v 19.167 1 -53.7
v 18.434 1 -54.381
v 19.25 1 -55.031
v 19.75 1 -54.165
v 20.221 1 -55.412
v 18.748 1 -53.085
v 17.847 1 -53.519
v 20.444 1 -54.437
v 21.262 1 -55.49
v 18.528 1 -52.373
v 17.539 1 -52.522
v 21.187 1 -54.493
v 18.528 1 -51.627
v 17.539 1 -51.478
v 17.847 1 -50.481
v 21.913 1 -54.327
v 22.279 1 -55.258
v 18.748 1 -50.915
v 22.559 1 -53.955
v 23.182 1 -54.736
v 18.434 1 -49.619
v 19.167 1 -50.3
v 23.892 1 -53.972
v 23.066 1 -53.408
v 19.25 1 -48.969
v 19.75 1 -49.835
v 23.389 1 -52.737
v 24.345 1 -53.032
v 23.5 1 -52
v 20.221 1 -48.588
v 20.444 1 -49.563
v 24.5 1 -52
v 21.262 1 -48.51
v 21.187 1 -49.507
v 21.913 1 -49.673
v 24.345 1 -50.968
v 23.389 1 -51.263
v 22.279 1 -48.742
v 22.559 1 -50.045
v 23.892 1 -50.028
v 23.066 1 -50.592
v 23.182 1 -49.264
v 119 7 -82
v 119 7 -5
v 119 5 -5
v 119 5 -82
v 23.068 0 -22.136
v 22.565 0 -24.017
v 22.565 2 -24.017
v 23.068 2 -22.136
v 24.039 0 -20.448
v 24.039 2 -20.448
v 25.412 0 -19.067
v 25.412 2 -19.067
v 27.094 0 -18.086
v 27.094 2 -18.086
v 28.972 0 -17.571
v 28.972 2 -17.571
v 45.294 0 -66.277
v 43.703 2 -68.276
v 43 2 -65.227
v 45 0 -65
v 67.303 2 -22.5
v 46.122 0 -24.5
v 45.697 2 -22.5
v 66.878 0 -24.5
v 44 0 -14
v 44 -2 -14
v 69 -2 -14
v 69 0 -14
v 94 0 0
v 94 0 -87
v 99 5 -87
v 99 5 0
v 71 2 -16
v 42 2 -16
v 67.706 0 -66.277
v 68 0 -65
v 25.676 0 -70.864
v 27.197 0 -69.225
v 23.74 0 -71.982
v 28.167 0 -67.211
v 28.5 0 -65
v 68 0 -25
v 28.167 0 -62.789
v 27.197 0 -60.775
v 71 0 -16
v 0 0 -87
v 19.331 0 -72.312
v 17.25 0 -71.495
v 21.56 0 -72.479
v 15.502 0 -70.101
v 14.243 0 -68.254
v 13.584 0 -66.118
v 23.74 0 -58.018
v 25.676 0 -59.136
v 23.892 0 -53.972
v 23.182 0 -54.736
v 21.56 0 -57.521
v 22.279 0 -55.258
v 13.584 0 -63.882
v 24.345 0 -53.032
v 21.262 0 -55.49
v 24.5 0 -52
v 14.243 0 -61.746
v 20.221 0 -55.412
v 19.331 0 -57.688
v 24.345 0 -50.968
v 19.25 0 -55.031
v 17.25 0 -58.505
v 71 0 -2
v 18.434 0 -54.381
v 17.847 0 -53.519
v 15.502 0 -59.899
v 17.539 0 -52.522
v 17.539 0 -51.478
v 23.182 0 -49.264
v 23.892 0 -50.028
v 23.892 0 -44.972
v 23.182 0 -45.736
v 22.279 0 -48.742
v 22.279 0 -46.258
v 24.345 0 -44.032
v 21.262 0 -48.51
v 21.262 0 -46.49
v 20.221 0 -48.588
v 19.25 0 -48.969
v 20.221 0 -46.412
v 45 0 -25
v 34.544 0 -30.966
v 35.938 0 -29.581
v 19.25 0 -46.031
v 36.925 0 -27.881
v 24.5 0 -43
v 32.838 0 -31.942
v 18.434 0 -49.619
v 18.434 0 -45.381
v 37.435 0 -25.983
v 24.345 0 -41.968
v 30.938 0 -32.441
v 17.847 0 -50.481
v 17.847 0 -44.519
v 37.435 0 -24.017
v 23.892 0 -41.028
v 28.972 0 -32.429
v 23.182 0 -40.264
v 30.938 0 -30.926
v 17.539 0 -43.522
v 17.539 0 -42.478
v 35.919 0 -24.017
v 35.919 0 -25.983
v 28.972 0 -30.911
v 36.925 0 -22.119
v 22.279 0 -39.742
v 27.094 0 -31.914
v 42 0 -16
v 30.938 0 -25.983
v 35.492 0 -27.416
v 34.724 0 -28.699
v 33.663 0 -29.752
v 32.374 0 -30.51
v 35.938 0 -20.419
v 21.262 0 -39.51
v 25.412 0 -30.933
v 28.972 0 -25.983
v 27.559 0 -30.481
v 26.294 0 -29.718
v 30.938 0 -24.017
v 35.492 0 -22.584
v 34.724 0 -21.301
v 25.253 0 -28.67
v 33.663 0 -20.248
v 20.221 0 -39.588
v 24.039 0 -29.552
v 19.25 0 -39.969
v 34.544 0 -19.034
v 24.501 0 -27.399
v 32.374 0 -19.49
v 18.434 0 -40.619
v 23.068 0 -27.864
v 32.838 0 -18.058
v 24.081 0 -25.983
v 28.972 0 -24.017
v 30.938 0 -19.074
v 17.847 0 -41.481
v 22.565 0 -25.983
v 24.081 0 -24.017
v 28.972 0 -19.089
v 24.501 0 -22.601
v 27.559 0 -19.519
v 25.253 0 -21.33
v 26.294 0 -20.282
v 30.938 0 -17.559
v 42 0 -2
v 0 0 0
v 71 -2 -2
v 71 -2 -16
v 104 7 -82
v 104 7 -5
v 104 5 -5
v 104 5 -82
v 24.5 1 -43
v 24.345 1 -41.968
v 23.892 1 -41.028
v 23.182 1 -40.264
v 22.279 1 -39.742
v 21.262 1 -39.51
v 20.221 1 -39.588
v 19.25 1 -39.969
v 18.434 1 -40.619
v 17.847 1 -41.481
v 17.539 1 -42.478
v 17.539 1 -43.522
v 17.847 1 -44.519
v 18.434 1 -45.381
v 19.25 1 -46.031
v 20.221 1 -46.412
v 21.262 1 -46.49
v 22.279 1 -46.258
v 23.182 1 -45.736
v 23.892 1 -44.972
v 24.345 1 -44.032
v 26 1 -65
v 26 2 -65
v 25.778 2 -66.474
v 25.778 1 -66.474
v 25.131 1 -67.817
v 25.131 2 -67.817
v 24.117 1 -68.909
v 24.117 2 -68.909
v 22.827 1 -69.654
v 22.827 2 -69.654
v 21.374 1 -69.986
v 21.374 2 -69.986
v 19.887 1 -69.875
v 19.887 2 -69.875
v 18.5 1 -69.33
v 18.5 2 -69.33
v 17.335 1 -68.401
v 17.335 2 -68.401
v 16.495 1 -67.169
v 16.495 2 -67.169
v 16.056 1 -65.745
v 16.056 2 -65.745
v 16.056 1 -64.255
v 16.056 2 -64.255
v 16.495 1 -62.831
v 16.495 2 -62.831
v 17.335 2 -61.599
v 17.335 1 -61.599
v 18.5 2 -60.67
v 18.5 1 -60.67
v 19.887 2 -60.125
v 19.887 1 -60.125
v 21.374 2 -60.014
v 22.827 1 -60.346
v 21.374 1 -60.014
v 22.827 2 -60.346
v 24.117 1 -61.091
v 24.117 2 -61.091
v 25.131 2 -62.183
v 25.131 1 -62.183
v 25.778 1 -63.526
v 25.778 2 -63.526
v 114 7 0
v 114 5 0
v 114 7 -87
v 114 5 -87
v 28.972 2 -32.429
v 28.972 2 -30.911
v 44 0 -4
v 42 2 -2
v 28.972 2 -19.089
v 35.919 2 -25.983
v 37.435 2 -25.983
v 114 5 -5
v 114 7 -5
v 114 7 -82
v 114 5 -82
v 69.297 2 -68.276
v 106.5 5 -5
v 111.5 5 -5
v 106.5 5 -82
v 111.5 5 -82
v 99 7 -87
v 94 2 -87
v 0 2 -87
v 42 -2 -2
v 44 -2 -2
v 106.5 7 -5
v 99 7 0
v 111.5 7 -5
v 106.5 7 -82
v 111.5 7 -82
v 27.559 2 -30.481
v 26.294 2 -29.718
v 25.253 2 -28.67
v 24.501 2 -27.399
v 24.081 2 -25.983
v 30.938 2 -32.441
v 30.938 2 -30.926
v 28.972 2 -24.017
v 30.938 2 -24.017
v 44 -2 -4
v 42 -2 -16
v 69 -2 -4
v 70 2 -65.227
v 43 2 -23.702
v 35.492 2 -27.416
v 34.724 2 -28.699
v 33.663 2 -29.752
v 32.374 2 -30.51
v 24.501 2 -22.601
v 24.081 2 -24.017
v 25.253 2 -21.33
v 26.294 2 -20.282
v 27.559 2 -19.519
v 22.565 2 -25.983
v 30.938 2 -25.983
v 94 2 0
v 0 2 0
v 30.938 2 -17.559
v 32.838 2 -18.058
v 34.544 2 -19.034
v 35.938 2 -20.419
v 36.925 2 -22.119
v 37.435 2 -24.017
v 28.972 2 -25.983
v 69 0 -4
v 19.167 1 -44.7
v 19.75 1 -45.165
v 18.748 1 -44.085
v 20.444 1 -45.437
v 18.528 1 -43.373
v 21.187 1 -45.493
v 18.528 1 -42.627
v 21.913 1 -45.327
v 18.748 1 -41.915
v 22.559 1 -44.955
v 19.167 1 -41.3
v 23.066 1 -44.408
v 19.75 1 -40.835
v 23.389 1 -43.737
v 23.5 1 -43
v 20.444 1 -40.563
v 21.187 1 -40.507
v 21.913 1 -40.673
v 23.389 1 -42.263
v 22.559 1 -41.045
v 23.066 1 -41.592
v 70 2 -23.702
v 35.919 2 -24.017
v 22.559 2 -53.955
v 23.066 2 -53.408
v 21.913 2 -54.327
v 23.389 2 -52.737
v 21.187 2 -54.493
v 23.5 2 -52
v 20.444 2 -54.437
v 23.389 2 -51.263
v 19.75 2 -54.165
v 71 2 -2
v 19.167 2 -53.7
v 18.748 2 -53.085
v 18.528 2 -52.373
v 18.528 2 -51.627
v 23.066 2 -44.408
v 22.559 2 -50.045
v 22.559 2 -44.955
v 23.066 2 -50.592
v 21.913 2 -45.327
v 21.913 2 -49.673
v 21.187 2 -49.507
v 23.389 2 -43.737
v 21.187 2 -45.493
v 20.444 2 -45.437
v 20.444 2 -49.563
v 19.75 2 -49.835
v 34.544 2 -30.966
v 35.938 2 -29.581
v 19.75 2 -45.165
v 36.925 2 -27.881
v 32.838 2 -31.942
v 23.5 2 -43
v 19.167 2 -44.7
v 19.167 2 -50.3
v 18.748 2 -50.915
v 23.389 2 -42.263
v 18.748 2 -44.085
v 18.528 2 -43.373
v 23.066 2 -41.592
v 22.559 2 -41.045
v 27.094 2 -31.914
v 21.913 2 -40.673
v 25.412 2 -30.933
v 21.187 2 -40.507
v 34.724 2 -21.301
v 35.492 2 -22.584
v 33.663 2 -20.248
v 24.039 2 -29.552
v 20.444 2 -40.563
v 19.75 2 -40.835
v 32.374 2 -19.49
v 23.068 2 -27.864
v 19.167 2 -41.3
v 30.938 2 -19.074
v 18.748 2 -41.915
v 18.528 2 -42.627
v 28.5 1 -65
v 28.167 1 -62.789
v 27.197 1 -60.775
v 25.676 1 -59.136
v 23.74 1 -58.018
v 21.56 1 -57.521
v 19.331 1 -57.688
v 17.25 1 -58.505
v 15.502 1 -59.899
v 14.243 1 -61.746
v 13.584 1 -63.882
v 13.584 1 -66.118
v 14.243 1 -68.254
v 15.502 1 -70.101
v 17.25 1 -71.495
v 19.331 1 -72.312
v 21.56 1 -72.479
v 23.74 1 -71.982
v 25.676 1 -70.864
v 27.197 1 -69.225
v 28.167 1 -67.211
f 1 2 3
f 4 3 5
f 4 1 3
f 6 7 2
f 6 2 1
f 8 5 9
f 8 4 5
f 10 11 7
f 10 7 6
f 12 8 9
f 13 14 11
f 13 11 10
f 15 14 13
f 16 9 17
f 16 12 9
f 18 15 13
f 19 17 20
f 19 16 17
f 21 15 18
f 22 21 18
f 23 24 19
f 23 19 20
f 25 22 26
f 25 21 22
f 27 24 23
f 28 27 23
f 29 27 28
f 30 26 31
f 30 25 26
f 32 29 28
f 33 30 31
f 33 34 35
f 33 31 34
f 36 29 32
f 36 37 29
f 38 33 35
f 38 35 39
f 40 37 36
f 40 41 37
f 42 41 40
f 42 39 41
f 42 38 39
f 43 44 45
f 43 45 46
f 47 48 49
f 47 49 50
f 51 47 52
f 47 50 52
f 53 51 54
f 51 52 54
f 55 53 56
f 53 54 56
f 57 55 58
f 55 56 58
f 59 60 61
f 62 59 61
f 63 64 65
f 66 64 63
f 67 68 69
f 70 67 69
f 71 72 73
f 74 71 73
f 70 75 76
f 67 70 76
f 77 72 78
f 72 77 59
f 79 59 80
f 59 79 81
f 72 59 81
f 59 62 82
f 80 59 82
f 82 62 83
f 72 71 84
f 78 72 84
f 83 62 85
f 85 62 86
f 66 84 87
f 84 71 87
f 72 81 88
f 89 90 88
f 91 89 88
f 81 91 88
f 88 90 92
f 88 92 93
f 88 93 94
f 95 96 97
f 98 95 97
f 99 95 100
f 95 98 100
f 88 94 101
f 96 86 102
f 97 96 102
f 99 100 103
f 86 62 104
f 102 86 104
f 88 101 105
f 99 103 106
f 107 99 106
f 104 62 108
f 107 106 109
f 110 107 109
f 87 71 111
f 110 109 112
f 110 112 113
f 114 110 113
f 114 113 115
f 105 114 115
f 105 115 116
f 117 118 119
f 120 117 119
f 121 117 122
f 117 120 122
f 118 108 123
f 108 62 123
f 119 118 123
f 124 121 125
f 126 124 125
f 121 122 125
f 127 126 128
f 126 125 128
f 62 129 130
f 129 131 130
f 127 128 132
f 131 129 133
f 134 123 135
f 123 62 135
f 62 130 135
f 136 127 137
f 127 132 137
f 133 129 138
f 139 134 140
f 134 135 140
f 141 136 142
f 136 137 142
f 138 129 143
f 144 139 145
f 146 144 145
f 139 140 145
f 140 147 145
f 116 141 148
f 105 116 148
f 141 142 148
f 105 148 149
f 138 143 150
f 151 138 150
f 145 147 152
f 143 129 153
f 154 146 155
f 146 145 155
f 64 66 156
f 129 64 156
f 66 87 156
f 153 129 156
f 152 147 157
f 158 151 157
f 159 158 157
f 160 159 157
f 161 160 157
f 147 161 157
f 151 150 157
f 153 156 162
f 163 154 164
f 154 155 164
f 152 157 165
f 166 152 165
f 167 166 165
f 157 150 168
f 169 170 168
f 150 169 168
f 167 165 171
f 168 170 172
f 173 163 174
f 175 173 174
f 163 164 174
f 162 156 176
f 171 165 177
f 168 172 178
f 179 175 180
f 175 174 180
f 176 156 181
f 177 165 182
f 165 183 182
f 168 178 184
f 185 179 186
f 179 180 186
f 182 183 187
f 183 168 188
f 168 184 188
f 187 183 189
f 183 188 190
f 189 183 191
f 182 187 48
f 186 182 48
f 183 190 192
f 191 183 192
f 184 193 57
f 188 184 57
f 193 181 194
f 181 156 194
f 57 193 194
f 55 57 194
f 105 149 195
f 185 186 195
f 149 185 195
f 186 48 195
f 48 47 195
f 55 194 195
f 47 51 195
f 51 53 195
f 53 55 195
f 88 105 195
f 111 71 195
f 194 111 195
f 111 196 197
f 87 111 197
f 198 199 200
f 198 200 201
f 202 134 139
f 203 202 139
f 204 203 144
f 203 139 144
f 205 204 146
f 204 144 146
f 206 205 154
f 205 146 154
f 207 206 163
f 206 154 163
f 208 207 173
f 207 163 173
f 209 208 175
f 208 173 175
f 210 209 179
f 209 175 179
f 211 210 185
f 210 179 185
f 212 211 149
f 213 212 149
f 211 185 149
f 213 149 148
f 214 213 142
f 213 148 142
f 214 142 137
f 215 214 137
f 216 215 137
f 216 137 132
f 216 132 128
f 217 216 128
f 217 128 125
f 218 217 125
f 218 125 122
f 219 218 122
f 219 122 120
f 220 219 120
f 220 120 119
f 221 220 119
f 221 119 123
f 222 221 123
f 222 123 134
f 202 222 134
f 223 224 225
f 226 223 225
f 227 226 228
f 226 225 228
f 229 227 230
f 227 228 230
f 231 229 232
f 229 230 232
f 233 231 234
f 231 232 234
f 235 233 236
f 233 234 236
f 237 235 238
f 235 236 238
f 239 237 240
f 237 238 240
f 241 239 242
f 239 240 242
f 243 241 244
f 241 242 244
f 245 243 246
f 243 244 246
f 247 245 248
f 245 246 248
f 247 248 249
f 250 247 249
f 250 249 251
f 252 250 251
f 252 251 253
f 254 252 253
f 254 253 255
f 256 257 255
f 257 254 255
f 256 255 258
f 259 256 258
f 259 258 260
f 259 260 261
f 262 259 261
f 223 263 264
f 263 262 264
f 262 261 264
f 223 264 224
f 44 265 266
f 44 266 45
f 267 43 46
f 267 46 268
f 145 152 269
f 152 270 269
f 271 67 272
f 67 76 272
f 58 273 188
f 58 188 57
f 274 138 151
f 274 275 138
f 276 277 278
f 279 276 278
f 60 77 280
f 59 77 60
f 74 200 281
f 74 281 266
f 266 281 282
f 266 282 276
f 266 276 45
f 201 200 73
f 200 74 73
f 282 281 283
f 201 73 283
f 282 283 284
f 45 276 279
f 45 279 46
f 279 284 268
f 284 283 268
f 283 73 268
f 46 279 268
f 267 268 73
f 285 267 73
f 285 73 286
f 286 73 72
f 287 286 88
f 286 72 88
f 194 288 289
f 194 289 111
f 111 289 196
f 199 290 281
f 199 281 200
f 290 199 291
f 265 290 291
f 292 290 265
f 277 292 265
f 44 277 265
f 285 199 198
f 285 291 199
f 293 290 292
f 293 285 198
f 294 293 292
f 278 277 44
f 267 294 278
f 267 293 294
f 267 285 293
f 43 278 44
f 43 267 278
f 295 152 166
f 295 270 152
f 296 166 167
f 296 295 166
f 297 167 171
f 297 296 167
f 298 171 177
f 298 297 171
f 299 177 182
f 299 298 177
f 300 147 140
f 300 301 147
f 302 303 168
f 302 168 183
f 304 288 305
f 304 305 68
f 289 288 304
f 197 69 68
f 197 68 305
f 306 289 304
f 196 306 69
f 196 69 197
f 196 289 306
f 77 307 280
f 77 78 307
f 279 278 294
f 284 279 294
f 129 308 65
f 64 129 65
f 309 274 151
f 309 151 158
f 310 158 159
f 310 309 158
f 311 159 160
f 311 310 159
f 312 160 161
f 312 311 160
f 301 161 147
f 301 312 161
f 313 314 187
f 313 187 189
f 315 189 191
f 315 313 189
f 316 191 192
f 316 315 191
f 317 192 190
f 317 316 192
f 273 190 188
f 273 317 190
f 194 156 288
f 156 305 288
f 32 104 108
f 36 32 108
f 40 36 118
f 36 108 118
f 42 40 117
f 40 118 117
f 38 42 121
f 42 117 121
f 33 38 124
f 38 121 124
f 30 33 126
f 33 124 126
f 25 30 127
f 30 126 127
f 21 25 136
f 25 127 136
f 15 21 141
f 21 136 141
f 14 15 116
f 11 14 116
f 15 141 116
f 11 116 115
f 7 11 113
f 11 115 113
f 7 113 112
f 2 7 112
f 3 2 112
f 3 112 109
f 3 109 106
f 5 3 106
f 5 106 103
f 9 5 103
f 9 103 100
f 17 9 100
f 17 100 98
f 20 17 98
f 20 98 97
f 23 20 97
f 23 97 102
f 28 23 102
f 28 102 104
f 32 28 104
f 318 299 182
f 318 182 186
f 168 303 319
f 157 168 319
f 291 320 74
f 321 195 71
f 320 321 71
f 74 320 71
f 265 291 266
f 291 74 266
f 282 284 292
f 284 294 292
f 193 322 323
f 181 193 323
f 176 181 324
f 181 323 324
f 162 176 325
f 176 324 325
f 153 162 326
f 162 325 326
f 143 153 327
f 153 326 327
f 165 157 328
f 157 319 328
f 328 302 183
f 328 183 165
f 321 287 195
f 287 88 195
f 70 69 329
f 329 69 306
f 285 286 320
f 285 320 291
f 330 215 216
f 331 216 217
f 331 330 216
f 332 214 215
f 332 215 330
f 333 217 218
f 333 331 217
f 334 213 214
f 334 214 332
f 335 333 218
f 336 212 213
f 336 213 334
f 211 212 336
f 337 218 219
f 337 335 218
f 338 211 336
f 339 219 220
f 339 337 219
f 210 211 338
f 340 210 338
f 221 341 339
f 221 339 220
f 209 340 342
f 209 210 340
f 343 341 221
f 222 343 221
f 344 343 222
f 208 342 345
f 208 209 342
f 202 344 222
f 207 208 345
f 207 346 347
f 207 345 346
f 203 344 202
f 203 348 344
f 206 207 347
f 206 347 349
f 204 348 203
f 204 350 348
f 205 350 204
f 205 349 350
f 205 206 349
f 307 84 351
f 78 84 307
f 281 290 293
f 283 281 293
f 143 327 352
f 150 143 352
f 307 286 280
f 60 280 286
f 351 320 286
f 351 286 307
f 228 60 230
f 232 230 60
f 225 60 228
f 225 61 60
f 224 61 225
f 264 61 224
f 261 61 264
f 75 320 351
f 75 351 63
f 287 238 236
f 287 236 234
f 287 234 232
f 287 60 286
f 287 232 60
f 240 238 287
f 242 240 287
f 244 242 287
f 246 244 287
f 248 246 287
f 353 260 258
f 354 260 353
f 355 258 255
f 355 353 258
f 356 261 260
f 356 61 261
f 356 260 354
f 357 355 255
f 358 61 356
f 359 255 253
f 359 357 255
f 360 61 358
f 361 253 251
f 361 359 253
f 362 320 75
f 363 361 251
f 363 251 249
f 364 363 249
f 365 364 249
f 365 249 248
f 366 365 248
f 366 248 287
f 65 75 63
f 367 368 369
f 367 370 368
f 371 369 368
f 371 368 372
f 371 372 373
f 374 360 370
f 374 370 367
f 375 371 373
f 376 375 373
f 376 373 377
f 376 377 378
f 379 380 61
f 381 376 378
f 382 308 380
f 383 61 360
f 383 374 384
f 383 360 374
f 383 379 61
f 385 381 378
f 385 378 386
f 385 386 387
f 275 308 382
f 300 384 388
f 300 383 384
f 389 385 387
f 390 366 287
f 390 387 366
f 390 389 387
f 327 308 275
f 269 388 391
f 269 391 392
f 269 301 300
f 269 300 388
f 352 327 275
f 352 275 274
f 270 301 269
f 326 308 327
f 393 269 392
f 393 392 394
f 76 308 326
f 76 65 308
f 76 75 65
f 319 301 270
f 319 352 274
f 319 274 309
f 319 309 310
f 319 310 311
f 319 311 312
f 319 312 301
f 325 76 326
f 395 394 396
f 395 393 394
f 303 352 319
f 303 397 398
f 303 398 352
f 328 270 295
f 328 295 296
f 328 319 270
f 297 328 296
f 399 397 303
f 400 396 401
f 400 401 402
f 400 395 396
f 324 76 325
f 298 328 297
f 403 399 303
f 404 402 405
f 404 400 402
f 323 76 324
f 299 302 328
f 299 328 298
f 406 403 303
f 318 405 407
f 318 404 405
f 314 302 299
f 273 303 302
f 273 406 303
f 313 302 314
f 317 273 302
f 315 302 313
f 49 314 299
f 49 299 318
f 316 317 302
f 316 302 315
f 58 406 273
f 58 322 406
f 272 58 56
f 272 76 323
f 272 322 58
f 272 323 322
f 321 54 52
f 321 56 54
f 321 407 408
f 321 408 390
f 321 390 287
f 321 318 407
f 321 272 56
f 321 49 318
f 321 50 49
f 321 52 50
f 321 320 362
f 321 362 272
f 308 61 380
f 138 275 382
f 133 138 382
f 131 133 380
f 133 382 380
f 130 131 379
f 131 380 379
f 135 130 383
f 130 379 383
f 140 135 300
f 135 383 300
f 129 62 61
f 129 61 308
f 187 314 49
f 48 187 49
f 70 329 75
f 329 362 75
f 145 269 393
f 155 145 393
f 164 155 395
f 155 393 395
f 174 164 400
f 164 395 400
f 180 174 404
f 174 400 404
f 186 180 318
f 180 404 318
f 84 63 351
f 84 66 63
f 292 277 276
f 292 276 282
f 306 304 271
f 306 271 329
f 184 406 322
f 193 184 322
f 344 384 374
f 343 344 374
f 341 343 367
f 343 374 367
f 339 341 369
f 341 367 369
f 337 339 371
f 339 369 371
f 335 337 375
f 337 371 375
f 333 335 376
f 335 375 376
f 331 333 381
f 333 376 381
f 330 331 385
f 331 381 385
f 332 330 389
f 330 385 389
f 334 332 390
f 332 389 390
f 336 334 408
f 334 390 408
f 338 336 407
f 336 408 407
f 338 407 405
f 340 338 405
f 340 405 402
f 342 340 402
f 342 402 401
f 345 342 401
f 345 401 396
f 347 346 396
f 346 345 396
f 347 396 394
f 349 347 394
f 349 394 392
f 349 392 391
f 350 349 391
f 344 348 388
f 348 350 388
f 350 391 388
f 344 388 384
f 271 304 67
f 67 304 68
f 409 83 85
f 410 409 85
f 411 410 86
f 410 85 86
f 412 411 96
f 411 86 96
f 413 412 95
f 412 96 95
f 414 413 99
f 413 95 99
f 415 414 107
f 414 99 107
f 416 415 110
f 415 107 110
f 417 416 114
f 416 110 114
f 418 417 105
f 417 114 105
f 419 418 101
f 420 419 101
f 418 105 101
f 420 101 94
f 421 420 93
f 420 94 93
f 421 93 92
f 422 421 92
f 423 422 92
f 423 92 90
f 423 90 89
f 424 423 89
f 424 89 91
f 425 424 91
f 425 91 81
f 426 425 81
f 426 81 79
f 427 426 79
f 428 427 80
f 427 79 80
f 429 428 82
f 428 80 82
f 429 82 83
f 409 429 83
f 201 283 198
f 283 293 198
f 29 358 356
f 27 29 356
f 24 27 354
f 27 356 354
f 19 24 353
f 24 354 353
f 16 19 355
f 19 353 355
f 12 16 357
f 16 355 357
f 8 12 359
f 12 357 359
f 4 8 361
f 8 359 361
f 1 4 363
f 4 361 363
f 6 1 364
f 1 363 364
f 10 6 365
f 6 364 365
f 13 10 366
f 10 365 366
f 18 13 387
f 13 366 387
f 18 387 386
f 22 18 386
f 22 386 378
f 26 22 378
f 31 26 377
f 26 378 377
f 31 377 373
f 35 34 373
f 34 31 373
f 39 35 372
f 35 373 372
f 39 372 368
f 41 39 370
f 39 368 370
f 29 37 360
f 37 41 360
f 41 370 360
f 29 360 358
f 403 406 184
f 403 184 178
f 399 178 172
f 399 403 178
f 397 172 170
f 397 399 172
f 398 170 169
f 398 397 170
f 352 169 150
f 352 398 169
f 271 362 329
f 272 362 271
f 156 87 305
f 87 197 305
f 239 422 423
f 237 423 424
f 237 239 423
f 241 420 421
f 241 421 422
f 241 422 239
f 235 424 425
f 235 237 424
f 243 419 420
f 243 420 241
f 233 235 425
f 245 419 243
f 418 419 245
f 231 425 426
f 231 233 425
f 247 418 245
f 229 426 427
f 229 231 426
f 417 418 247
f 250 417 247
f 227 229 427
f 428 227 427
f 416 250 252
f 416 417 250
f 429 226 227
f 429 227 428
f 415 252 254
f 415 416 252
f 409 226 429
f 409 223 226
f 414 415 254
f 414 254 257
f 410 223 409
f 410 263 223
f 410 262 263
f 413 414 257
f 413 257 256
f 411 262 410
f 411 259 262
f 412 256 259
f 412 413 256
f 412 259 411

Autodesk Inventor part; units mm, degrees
ref_plane "YZ Plane" through (0, 0, 0) normal (1, 0, 0) x (0, 1, 0)
ref_plane "XZ Plane" through (0, 0, 0) normal (0, 1, 0) x (-1, 0, 0)
ref_plane "XY Plane" through (0, 0, 0) normal (0, 0, 1) x (1, 0, 0)
sketch "Sketch1" plane through (0, 0, 0) normal (0, 1, 0) x (-1, 0, 0)
  line L0 (0, 0) -> (-94, 0)
  line L1 (-94, 0) -> (-94, -87)
  line L2 (-94, -87) -> (0, -87)
  line L3 (0, -87) -> (0, 0)
  dimension "d0" = 94
  dimension "d1" = 87
extrude "Extrusion1" add sketch "Sketch1" along normal blind 2
sketch "Sketch2" plane through (0, 0, 0) normal (0, 0, 1) x (1, 0, 0)
  line L0 (94, 2) -> (0, 2) projected
  line L1 (-0.0001, 2) -> (94, 2)
  line L2 (94, 2) -> (99, 7)
  line L3 (94, 2) -> (101.071, 2) construction
  line L4 (94, 0) -> (99, 5)
  line L5 (99, 5) -> (114, 5)
  line L6 (114, 5) -> (114, 7)
  line L7 (114, 7) -> (99, 7)
  line L8 (94, 0) -> (94, 2) projected
  line L9 (94, 0) -> (94, 2)
  point P0 (0, 0)
  dimension "d4" = 7.071
  dimension "d5" = 45
  dimension "d6" = 7.071
  dimension "d7" = 15
  dimension "d8" = 2
extrude "Extrusion2" add sketch "Sketch2" against normal blind 87
sketch "Sketch3" plane through (99, 7, 0) normal (0, 1, 0) x (1, 0, 0)
  line L0 (15, 0) -> (0, 0) projected
  line L1 (15, 0) -> (20, 5)
  line L2 (15, 0) -> (22.071, 0) construction
  line L3 (20, 5) -> (20, 82)
  line L4 (0, 87) -> (15, 87) projected
  line L5 (20, 82) -> (15, 87)
  line L6 (15, 0) -> (15, 87)
  point P0 (-99, 0)
  dimension "d11" = 7.071
  dimension "d12" = 45
  dimension "d13" = 77
extrude "Extrusion3" add sketch "Sketch3" against normal blind 2
sketch "Sketch4" plane through (0, 2, 0) normal (0, 1, 0) x (1, 0, 0)
  line L0 (0, 0) -> (94, 0) projected
  line L1 (0, 0) -> (0, 4)
  line L2 (0, 87) -> (0, 0) projected
  line L3 (0, 4) -> (94, 4)
  line L4 (0, 4) -> (44, 4)
  line L5 (44, 4) -> (44, 14)
  line L6 (44, 14) -> (69, 14)
  line L7 (69, 14) -> (69, 4)
  dimension "d16" = 4
  dimension "d17" = 44
  dimension "d18" = 10
  dimension "d19" = 25
extrude "Extrusion4" cut sketch "Sketch4" against normal blind 10
ref_plane "Work Plane1" through (0, -2, 0) normal (0, -1, 0) x (1, 0, 0)
sketch "Sketch6" plane through (0, -2, 0) normal (0, -1, 0) x (1, 0, 0)
  line L0 (44, -4) -> (44, -14) projected
  line L1 (44, -4) -> (44, -2)
  line L2 (0, 0) -> (94, 0) projected
  line L3 (44, -2) -> (42, -2)
  line L4 (42, -2) -> (71, -2)
  line L5 (71, -2) -> (71, -16)
  line L6 (71, -16) -> (42, -16)
  line L7 (42, -16) -> (42, -2)
  line L8 (44, -4) -> (69, -4) projected
  line L9 (44, -14) -> (69, -14)
  line L10 (69, -14) -> (69, -4)
  line L11 (69, -4) -> (44, -4)
  line L12 (44, -4) -> (44, -14)
  dimension "d23" = 2
  dimension "d24" = 2
  dimension "d25" = 29
  dimension "d26" = 14
extrude "Extrusion5" add sketch "Sketch6" against normal blind 2
chamfer "Chamfer1" distance 2 angle 45 4 edges at (44, 2, -9) (56.5, 2, -14) (69, 2, -9) (56.5, 2, -4)
sketch "Sketch8" plane through (0, 2, 0) normal (0, 1, 0) x (1, 0, 0)
  line L0 (0, 0) -> (0, 25)
  line L1 (0, 87) -> (0, 0) projected
  line L2 (0, 25) -> (30, 25)
  circle A0 centre (30, 25) radius 7.5
  line L3 (30, 17.5) -> (30, 32.5)
  line L4 (37.5, 25) -> (22.5, 25)
  circle A1 centre (30, 25) radius 6
  line L5 (37.5, 25) -> (30, 25)
  line L6 (30, 25) -> (24, 25)
  line L7 (30, 25) -> (33.75, 25)
  line L8 (30, 25) -> (31.875, 25)
  line L9 (30, 25) -> (30.9375, 25)
  line L10 (30.9375, 25) -> (30.9375, 32.4412)
  line L11 (30.9375, 25) -> (28.9715, 25)
  line L12 (28.9715, 25) -> (28.9715, 32.4291)
  line L13 (30.9375, 25) -> (30.9375, 17.5588)
  line L14 (28.9715, 25) -> (28.9715, 17.5709)
  line L15 (30, 25) -> (30, 24.017)
  line L16 (30, 24.017) -> (30, 25.983)
  line L17 (37.4353, 25.983) -> (22.5647, 25.983)
  line L18 (37.4353, 24.017) -> (22.5647, 24.017)
  point P0 (30.9375, 24.017)
  point P1 (30.9375, 25.983)
  point P2 (28.9715, 25.983)
  point P3 (28.9715, 24.017)
  point P4 (24.0811, 25.983)
  point P5 (28.9715, 30.9112)
  point P6 (24.0811, 24.017)
  point P7 (28.9715, 19.0888)
  point P8 (35.9189, 24.017)
  point P9 (30.9375, 19.0737)
  point P10 (35.9189, 25.983)
  point P11 (30.9375, 30.9263)
  dimension "d34" = 15
  dimension "d35" = 12
  dimension "d32" = 25
  dimension "d33" = 30
  dimension "d36" = 1.966
  dimension "d37" = 0.983
  dimension "d38" = 1.966
extrude "Extrusion6" cut sketch "Sketch8" against normal blind 2 contours A0 L12 A1 L17 | L18 A1 L14 A0 | L12 L17 L3 L2 | L2 L3 L18 L14 | L4 L13 L18 L3 | L3 L17 L10 L4 | A0 L17 A1 L10 | L13 A1 L18 A0
sketch "Sketch9" plane through (0, 2, 0) normal (0, 1, 0) x (1, 0, 0)
  line L0 (0, 0) -> (0, 43)
  line L1 (0, 87) -> (0, 0) projected
  line L2 (0, 43) -> (21, 43)
  circle A0 centre (21, 43) radius 2.5
  line L3 (0, 0) -> (0, 52)
  line L4 (0, 52) -> (21, 52)
  circle A1 centre (21, 52) radius 2.5
  line L5 (0, 0) -> (0, 65)
  line L6 (0, 65) -> (21, 65)
  circle A2 centre (21, 65) radius 5
  dimension "d41" = 43
  dimension "d42" = 21
  dimension "d43" = 90
  dimension "d44" = 5
  dimension "d45" = 52
  dimension "d46" = 5
  dimension "d47" = 65
  dimension "d48" = 21
  dimension "d49" = 10
extrude "Extrusion7" cut sketch "Sketch9" against normal blind 2
sketch "Sketch10" plane through (0, 2, 0) normal (0, 1, 0) x (1, 0, 0)
  line L0 (0, 87) -> (0, 0) projected
  line L1 (0, 0) -> (43, 0)
  line L2 (0, 0) -> (94, 0) projected
  line L3 (43, 0) -> (43, 45)
  line L4 (71, 2) -> (42, 2) projected
  line L5 (71, 2) -> (70, 2)
  line L6 (70, 2) -> (70, 45)
  line L7 (70, 45) -> (74, 45) construction
  line L8 (70, 45) -> (70, 65)
  line L9 (70, 45) -> (90, 45) construction
  line L10 (70, 65) -> (67.7057, 68.2766)
  line L11 (67.7057, 68.2766) -> (45.2943, 68.2766)
  line L12 (43, 45) -> (43, 65)
  line L13 (43, 65) -> (45.2943, 68.2766)
  line L14 (70, 45) -> (70, 25)
  line L15 (70, 25) -> (66.8775, 22.5)
  line L16 (43, 45) -> (43, 25)
  line L17 (43, 25) -> (46.1225, 22.5)
  line L18 (46.1225, 22.5) -> (66.8775, 22.5)
  line L19 (66.8775, 22.5) -> (66.8775, 24.5)
  line L20 (70, 25) -> (68, 25)
  line L21 (68, 25) -> (66.8775, 24.5)
  line L22 (70, 65) -> (68, 65)
  line L23 (67.7057, 68.2766) -> (67.7057, 66.2766)
  line L24 (45.2943, 68.2766) -> (45.2943, 66.2766)
  line L25 (43, 65) -> (45, 65)
  line L26 (46.1225, 22.5) -> (46.1225, 24.5)
  line L27 (43, 25) -> (45, 25)
  line L28 (45, 25) -> (45, 65)
  line L29 (45, 65) -> (45.2943, 66.2766)
  line L30 (45.2943, 66.2766) -> (67.7057, 66.2766)
  line L31 (67.7057, 66.2766) -> (68, 65)
  line L32 (68, 65) -> (68, 25)
  line L33 (66.8775, 24.5) -> (46.1225, 24.5)
  line L34 (46.1225, 24.5) -> (45, 25)
  dimension "d52" = 43
  dimension "d53" = 45
  dimension "d54" = 1
  dimension "d58" = 20
  dimension "d59" = 90
  dimension "d60" = 20
  dimension "d61" = 4
  dimension "d62" = 20
  dimension "d63" = 4
  dimension "d64" = 2
  dimension "d65" = 2
  dimension "d66" = 2
  dimension "d67" = 2
  dimension "d68" = 2
  dimension "d69" = 2
  dimension "d70" = 2
  dimension "d71" = 2
extrude "Extrusion8" cut sketch "Sketch10" against normal blind 2 contours L28 L29 L30 L31 L32 L21 L33 L34
chamfer "Chamfer2" distance 2 angle 45 8 edges at (45, 2, -45) (45.5612, 2, -24.75) (56.5, 2, -24.5) (67.4388, 2, -24.75) (68, 2, -45) (56.5, 2, -66.2766) (45.1472, 2, -65.6383) (67.8528, 2, -65.6383)
sketch "Sketch11" plane through (0, 2, 0) normal (0, 1, 0) x (1, 0, 0)
  line L0 (45.6972, 22.5) -> (67.3028, 22.5) projected
  line L1 (67.3028, 22.5) -> (45.6972, 22.5)
  line L2 (43, 23.7014) -> (45.6972, 22.5) projected
  line L3 (45.6972, 22.5) -> (43, 23.7014)
  line L4 (43, 23.7014) -> (45, 25) projected
  line L5 (43, 65.2276) -> (43, 23.7014) projected
  line L6 (43, 23.7014) -> (43, 65.2276)
  line L7 (43.7029, 68.2766) -> (45.2943, 66.2766) projected
  line L8 (43, 65.2276) -> (43.7029, 68.2766)
  line L9 (70, 23.7014) -> (70, 65.2276) projected
  line L10 (43, 23.7014) -> (70, 23.7014)
  line L11 (70, 65.2276) -> (68, 65) projected
  line L12 (43, 65.2276) -> (70, 65.2276)
  line L13 (69.2971, 68.2766) -> (43.7029, 68.2766) projected
  line L14 (43.7029, 68.2766) -> (69.2971, 68.2766)
  line L15 (45.6972, 22.5) -> (67.3028, 22.5)
  line L16 (43, 65.2276) -> (43.7029, 68.2766)
  line L17 (43.7029, 68.2766) -> (69.2971, 68.2766)
  line L18 (46.1225, 24.5) -> (66.8775, 24.5) projected
  line L19 (66.8775, 24.5) -> (46.1225, 24.5)
  line L20 (45.6972, 22.5) -> (43, 23.7014)
  line L21 (43, 23.7014) -> (43, 65.2276)
  line L22 (43, 65.2276) -> (43.7029, 68.2766)
  line L23 (69.2971, 68.2766) -> (43.7029, 68.2766)
  line L24 (70, 65.2276) -> (69.2971, 68.2766) projected
  line L25 (69.2971, 68.2766) -> (70, 65.2276)
  line L26 (67.3028, 22.5) -> (70, 23.7014) projected
  line L27 (67.3028, 22.5) -> (70, 23.7014)
  line L28 (68, 25) -> (68, 65) projected
  line L29 (66.8775, 24.5) -> (68, 25)
  line L30 (68, 65) -> (68, 25)
  line L31 (66.8775, 24.5) -> (46.1225, 24.5)
  line L32 (45, 25) -> (46.1225, 24.5) projected
  line L33 (46.1225, 24.5) -> (45, 25)
  line L34 (45, 25) -> (45, 65)
  line L35 (45, 65) -> (45.2943, 66.2766)
  line L36 (67.7057, 66.2766) -> (45.2943, 66.2766) projected
  line L37 (68, 65) -> (67.7057, 66.2766)
  point P0 (0, 0)
sketch "Sketch12" plane through (99, 7, 0) normal (0, 1, 0) x (1, 0, 0)
  line L0 (20, 5) -> (15, 0) projected
  line L1 (20, 5) -> (0, 5)
  line L2 (0, 0) -> (0, 87) projected
  line L3 (15, 87) -> (20, 82) projected
  line L4 (20, 82) -> (0, 82)
  line L5 (10, 82) -> (10, 5)
  line L6 (0, 5) -> (10, 5)
  line L7 (5, 5) -> (5, 82)
  line L8 (10, 5) -> (20, 5)
  line L9 (15, 5) -> (15, 82)
  line L10 (10, 5) -> (15, 5)
  line L11 (10, 5) -> (5, 5)
  line L12 (7.5, 5) -> (7.5, 82)
  line L13 (12.5, 82) -> (12.5, 5)
  point P0 (-99, 0)
  point P1 (7.5, 5)
  point P2 (5, 5)
  point P3 (12.5, 5)
  point P4 (15, 5)
extrude "Extrusion9" cut sketch "Sketch12" against normal blind 2 contours L1 L13 L4 L9 | L1 L7 L4 L12
sketch "Sketch13" plane through (0, 0, 0) normal (0, -1, 0) x (1, 0, 0)
  circle A0 centre (21, -52) radius 2.5 projected
  circle A1 centre (21, -52) radius 3.5
  circle A2 centre (21, -43) radius 2.5 projected
  circle A3 centre (21, -43) radius 3.5
  circle A4 centre (21, -65) radius 5 projected
  circle A5 centre (21, -65) radius 7.5
  point P0 (0, 0)
  dimension "d79" = 7
  dimension "d80" = 7
  dimension "d81" = 15
extrude "Extrusion10" cut sketch "Sketch13" against normal blind 1
sketch "Sketch14" plane through (0, 0, 0) normal (0, -1, 0) x (1, 0, 0)
  circle A0 centre (21, -65) radius 5 projected
  circle A1 centre (21, -65) radius 5
  point P0 (0, 0)
equation "\"BendRadius\" = Thickness"
equation "\"BendReliefWidth\" = Thickness"
equation "\"BendReliefDepth\" = 0.5 * Thickness"
equation "\"CornerReliefSize\" = 4 * Thickness"
equation "\"MinimumRemnant\" = 2 * Thickness"
equation "\"TransitionRadius\" = BendRadius"
equation "\"JacobiRadiusSize\" = BendRadius"
equation "\"GapSize\" = Thickness"
equation "\"Thickness\" = 0.5"
properties part number "Part2edd"
